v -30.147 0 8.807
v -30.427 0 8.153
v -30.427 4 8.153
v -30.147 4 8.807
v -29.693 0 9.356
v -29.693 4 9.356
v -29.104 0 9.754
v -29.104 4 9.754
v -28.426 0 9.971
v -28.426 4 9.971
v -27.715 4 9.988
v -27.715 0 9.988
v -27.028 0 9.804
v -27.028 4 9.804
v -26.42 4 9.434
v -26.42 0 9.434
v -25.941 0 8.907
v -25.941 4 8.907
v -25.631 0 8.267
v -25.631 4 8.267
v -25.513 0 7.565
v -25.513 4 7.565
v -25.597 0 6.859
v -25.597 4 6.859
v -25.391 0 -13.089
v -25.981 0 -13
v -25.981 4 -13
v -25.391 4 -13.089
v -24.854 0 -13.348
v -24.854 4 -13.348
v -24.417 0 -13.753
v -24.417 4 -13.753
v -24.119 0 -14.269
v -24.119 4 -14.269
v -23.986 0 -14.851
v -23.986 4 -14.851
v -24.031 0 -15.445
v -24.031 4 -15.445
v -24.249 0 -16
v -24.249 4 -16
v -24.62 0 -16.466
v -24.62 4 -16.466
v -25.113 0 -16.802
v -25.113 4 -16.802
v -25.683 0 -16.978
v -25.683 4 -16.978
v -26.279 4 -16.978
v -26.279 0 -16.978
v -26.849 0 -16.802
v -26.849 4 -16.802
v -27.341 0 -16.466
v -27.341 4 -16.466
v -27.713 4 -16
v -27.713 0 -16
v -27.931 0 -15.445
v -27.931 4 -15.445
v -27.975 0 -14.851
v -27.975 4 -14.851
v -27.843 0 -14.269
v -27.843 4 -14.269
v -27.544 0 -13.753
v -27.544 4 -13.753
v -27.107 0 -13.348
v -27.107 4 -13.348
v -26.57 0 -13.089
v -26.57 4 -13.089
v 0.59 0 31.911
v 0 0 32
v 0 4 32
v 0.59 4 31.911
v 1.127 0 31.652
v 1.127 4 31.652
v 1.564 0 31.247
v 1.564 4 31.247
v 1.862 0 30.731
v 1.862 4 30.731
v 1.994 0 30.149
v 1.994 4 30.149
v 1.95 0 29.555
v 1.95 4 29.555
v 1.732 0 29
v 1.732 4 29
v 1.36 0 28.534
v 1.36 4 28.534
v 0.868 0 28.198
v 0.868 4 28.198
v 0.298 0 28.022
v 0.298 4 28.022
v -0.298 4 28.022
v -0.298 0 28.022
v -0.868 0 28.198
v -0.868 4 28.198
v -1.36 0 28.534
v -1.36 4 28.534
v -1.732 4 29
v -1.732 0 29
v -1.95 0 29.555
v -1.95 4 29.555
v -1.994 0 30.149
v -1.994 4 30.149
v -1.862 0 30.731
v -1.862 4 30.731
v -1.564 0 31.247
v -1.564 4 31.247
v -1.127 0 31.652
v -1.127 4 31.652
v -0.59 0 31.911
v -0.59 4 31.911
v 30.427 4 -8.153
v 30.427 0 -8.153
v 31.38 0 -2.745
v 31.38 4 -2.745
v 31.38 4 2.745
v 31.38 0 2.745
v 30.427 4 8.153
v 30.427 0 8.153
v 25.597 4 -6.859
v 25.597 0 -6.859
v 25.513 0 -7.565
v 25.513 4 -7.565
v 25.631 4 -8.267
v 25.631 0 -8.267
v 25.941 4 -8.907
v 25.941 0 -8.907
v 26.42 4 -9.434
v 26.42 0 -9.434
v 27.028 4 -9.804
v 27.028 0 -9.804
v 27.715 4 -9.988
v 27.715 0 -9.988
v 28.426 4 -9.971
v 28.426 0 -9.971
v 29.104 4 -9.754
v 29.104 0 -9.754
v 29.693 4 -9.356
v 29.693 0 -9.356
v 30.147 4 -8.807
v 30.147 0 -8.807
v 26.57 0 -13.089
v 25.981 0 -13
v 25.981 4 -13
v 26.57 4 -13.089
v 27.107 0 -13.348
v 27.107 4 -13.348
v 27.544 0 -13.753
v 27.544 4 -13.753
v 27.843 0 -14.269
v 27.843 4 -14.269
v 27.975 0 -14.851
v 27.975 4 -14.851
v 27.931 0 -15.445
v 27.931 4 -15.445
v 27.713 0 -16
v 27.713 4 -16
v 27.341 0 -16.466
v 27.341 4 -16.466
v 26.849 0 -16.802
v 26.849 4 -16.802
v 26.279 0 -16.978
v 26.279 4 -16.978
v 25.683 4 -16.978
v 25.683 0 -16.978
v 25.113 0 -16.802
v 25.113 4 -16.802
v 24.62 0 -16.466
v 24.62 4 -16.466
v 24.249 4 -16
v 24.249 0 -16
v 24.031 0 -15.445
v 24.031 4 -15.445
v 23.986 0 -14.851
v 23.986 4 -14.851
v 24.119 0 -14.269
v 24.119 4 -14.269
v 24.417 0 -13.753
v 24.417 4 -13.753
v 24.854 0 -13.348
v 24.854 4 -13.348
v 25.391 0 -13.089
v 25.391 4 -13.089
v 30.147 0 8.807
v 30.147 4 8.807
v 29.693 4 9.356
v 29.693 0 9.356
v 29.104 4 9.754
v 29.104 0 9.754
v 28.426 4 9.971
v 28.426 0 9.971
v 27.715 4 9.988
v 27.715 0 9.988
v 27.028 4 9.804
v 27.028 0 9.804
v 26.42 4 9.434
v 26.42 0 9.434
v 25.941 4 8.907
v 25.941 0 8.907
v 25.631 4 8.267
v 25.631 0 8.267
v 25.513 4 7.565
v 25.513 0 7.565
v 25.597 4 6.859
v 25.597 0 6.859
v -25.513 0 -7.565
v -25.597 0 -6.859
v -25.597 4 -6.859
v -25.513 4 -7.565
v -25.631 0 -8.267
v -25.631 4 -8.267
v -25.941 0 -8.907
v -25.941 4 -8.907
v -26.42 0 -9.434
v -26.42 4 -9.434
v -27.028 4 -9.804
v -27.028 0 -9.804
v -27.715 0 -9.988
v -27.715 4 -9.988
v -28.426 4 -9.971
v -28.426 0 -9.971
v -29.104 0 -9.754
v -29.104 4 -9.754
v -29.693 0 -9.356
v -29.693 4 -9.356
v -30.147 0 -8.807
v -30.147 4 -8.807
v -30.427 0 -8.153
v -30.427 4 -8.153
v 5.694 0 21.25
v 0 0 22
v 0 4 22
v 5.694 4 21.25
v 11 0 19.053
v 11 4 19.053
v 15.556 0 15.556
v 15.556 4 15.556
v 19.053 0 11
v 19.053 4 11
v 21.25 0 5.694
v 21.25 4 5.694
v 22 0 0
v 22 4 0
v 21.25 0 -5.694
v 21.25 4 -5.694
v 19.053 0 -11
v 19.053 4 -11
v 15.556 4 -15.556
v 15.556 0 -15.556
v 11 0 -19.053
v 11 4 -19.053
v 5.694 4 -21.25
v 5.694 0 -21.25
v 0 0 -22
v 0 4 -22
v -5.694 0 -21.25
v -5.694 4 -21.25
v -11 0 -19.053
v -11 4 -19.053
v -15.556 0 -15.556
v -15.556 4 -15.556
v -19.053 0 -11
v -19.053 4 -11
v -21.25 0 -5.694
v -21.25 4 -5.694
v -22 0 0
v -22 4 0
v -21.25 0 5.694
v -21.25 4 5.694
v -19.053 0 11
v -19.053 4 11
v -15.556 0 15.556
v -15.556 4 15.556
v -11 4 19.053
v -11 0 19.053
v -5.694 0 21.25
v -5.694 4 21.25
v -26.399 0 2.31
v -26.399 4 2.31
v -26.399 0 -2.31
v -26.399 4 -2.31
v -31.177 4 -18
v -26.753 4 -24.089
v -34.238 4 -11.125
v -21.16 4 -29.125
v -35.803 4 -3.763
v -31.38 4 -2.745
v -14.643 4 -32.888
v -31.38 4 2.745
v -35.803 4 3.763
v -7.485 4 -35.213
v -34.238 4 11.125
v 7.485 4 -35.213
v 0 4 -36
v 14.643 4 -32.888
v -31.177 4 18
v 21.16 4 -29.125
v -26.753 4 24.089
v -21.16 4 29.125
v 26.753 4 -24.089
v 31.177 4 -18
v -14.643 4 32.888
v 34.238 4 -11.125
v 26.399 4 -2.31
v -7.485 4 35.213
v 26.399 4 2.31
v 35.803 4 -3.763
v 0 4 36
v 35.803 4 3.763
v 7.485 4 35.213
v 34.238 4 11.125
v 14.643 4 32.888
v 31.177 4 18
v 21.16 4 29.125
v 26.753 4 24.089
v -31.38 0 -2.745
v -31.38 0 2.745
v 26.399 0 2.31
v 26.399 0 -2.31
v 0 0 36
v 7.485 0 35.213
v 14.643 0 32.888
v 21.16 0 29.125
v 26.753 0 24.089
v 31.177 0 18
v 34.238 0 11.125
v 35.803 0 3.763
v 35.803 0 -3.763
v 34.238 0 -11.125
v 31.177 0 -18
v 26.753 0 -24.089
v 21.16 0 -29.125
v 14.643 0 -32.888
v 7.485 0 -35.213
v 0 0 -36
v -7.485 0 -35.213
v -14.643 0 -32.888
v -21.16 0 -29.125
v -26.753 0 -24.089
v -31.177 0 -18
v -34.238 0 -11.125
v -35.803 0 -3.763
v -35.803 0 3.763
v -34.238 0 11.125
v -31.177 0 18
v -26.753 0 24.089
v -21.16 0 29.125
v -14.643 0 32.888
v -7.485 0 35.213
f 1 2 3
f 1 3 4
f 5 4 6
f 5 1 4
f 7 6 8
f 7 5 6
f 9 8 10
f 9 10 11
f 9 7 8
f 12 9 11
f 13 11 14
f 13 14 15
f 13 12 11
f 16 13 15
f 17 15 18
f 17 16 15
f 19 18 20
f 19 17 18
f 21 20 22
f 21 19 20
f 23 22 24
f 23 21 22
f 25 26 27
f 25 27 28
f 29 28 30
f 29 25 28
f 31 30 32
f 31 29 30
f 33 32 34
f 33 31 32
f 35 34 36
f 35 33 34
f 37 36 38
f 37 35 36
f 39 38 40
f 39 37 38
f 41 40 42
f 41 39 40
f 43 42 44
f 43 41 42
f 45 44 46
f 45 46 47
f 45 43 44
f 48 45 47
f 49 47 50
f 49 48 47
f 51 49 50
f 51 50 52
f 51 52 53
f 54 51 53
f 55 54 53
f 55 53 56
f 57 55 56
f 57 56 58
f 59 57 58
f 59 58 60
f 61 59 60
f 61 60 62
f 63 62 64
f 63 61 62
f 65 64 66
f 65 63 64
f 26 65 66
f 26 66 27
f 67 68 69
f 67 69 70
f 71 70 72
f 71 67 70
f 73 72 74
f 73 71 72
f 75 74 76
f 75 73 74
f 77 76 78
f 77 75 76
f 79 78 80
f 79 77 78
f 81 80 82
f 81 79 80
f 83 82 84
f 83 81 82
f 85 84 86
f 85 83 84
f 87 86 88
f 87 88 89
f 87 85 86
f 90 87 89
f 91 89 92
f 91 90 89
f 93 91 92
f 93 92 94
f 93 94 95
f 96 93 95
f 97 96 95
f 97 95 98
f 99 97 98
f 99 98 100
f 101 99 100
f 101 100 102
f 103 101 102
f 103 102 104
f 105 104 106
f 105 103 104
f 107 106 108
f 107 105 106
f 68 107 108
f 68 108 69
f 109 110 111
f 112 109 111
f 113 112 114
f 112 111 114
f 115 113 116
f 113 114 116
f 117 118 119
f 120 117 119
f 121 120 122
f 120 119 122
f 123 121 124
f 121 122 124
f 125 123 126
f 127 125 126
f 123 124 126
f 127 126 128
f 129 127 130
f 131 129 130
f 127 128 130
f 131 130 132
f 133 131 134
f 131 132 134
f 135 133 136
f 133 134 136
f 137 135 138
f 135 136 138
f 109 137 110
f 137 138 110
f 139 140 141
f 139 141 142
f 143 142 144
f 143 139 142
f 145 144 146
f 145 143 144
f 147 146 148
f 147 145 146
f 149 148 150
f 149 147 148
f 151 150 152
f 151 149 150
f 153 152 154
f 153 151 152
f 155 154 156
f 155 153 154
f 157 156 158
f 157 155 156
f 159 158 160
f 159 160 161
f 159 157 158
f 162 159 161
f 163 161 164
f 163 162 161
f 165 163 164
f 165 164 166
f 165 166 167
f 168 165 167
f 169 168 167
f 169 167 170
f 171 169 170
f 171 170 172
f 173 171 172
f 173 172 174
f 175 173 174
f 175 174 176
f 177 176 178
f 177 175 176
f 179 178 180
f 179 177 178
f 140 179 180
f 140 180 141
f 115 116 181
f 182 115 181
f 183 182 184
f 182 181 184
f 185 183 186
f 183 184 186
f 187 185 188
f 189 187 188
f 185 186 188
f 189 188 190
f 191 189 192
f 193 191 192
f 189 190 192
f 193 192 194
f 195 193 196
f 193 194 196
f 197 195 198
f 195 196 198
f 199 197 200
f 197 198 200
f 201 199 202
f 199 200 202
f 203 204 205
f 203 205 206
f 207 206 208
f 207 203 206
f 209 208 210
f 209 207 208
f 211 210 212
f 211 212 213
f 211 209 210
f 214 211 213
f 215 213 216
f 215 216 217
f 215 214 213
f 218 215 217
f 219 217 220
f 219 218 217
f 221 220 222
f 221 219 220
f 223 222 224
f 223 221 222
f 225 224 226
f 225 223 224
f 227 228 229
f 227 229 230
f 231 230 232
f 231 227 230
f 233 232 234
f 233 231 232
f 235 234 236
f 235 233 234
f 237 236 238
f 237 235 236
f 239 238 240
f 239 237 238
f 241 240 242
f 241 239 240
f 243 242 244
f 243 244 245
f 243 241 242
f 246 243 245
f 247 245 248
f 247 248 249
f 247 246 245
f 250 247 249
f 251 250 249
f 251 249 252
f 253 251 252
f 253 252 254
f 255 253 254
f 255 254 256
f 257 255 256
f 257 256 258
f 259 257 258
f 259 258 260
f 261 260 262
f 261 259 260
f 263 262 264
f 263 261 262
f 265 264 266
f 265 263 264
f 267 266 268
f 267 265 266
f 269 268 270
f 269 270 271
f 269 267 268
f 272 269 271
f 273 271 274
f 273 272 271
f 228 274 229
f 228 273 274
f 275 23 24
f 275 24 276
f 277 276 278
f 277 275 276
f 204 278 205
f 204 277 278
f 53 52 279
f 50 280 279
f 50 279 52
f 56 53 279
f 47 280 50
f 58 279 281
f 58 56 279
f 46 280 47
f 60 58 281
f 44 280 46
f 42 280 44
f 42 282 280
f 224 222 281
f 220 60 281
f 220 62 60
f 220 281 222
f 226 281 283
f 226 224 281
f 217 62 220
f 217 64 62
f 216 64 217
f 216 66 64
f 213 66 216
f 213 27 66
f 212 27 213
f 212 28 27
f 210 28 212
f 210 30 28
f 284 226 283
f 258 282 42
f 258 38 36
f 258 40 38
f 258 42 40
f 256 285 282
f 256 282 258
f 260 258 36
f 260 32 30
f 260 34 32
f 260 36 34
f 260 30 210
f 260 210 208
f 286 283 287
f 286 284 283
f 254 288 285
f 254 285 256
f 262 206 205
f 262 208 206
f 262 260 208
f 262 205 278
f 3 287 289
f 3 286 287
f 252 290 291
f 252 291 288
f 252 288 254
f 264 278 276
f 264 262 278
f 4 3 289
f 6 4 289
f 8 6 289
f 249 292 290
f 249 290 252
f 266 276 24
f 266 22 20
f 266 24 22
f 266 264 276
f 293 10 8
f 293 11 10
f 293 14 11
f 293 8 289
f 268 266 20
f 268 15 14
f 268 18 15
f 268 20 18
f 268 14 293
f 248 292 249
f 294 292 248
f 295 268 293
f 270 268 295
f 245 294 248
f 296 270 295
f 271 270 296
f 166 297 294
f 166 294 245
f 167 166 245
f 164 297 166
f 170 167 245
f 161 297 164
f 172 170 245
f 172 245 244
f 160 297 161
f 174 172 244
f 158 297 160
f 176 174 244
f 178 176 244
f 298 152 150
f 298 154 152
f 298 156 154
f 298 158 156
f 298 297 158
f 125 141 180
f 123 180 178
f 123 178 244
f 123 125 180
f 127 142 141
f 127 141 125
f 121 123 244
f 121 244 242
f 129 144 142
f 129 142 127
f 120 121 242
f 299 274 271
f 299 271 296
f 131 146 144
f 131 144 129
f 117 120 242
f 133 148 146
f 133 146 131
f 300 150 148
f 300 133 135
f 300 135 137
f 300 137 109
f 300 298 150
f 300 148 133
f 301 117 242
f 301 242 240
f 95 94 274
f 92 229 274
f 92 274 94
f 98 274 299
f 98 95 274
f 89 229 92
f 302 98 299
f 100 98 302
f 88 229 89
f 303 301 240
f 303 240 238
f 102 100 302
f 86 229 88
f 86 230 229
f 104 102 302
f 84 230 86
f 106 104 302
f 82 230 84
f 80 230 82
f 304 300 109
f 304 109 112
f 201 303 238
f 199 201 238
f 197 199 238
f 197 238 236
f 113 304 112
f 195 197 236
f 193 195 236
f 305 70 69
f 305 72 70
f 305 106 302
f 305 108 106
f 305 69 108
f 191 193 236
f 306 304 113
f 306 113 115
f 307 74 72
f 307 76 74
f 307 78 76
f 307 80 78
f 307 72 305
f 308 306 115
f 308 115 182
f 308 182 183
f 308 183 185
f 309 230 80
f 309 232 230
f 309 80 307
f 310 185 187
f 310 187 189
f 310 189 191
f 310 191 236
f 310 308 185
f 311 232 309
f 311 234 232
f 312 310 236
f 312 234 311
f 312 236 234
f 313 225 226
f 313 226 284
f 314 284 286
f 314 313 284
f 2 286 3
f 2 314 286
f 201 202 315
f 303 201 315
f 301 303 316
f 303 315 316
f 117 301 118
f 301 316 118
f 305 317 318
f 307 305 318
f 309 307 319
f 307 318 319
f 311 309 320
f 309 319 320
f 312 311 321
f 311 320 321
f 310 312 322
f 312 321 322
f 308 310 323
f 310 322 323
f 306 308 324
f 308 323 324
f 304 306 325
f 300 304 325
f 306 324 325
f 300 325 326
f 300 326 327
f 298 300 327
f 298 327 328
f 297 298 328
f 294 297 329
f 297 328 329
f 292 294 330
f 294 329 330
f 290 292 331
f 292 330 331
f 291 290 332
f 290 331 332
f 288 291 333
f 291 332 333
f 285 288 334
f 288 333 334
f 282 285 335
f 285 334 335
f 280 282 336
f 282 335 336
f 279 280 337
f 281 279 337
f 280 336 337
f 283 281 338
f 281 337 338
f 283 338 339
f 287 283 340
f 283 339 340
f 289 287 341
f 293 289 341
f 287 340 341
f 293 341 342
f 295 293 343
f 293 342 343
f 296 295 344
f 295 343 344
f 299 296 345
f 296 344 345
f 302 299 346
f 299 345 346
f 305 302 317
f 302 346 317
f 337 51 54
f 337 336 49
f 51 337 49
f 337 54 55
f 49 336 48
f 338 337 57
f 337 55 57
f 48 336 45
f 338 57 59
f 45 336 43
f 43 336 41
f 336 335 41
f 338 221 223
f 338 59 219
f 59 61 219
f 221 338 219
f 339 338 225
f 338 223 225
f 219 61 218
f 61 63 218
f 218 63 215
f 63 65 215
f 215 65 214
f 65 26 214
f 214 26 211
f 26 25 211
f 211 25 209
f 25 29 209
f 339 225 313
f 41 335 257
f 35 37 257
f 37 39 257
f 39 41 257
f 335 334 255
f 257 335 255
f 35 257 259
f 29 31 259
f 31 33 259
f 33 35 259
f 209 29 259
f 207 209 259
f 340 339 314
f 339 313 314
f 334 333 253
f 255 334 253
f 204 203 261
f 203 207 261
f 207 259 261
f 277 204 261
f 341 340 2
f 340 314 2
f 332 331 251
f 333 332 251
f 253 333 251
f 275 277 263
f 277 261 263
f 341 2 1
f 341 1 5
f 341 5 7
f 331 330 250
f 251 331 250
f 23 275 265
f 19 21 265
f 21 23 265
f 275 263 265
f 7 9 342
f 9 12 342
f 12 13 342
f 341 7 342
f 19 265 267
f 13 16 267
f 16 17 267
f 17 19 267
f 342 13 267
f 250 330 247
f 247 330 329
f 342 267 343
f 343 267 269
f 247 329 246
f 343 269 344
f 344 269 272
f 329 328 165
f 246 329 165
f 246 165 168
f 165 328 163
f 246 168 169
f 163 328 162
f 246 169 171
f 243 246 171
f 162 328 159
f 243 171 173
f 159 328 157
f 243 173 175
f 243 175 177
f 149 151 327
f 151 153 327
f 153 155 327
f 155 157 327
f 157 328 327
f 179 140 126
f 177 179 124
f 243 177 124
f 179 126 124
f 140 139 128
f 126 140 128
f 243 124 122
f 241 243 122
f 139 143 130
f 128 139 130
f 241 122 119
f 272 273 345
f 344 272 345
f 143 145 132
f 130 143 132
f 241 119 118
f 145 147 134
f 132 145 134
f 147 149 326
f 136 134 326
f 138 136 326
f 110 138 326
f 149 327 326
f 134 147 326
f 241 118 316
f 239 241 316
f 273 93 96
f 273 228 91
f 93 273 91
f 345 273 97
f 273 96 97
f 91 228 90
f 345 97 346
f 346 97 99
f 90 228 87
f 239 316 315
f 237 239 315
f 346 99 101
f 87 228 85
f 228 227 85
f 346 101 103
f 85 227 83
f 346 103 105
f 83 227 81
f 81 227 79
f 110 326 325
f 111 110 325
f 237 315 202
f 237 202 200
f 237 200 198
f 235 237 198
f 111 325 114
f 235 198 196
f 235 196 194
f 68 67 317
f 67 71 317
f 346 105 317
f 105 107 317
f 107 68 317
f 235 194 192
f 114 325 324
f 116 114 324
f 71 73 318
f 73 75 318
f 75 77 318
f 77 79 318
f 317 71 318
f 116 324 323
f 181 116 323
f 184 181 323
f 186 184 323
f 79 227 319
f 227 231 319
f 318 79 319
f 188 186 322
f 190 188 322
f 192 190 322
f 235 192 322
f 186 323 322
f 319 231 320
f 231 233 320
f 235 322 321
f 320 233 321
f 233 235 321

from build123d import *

# Parameters (mm, degrees)
SKETCH_1_R      = 36
SKETCH_1_R_2    = 22
SKETCH_1_R_3    = 2
EXTRUDE_1_DEPTH = 4


with BuildPart() as part:
    # 草图1 → 凸台-拉伸1 (new body)
    with BuildSketch(Plane(origin=(0, 0, 0), x_dir=(1, 0, 0), z_dir=(0, 1, 0))):
        with Locations(Location((0, 0, 0), (0, 0, 270))):
            Circle(SKETCH_1_R)
        with Locations(Location((0, 0, 0), (0, 0, 270))):
            Circle(SKETCH_1_R_2, mode=Mode.SUBTRACT)
        with Locations(Location((-25.980762114, 15, 0), (0, 0, 270))):
            Circle(SKETCH_1_R_3, mode=Mode.SUBTRACT)
        with Locations(Location((25.980762114, 15, 0), (0, 0, 270))):
            Circle(SKETCH_1_R_3, mode=Mode.SUBTRACT)
        with Locations(Location((0, -30, 0), (0, 0, 270))):
            Circle(SKETCH_1_R_3, mode=Mode.SUBTRACT)
        with BuildLine():
            ThreePointArc((-30.426663528, 8.152799921), (-31.5, 0), (-30.426663528, -8.152799921))
            ThreePointArc((-30.426663528, -8.152799921), (-27.36480135, -9.920566874), (-25.597034397, -6.858704695))
            ThreePointArc((-25.597034397, -6.858704695), (-26.5, 0), (-25.597034397, 6.858704695))
            ThreePointArc((-25.597034397, 6.858704695), (-27.36480135, 9.920566874), (-30.426663528, 8.152799921))
        make_face(mode=Mode.SUBTRACT)
        with BuildLine():
            ThreePointArc((30.426663528, 8.152799921), (31.5, 0), (30.426663528, -8.152799921))
            ThreePointArc((30.426663528, -8.152799921), (27.36480135, -9.920566874), (25.597034397, -6.858704695))
            ThreePointArc((25.597034397, -6.858704695), (26.5, 0), (25.597034397, 6.858704695))
            ThreePointArc((25.597034397, 6.858704695), (27.36480135, 9.920566874), (30.426663528, 8.152799921))
        make_face(mode=Mode.SUBTRACT)
    extrude(amount=EXTRUDE_1_DEPTH)


solid = part.part
